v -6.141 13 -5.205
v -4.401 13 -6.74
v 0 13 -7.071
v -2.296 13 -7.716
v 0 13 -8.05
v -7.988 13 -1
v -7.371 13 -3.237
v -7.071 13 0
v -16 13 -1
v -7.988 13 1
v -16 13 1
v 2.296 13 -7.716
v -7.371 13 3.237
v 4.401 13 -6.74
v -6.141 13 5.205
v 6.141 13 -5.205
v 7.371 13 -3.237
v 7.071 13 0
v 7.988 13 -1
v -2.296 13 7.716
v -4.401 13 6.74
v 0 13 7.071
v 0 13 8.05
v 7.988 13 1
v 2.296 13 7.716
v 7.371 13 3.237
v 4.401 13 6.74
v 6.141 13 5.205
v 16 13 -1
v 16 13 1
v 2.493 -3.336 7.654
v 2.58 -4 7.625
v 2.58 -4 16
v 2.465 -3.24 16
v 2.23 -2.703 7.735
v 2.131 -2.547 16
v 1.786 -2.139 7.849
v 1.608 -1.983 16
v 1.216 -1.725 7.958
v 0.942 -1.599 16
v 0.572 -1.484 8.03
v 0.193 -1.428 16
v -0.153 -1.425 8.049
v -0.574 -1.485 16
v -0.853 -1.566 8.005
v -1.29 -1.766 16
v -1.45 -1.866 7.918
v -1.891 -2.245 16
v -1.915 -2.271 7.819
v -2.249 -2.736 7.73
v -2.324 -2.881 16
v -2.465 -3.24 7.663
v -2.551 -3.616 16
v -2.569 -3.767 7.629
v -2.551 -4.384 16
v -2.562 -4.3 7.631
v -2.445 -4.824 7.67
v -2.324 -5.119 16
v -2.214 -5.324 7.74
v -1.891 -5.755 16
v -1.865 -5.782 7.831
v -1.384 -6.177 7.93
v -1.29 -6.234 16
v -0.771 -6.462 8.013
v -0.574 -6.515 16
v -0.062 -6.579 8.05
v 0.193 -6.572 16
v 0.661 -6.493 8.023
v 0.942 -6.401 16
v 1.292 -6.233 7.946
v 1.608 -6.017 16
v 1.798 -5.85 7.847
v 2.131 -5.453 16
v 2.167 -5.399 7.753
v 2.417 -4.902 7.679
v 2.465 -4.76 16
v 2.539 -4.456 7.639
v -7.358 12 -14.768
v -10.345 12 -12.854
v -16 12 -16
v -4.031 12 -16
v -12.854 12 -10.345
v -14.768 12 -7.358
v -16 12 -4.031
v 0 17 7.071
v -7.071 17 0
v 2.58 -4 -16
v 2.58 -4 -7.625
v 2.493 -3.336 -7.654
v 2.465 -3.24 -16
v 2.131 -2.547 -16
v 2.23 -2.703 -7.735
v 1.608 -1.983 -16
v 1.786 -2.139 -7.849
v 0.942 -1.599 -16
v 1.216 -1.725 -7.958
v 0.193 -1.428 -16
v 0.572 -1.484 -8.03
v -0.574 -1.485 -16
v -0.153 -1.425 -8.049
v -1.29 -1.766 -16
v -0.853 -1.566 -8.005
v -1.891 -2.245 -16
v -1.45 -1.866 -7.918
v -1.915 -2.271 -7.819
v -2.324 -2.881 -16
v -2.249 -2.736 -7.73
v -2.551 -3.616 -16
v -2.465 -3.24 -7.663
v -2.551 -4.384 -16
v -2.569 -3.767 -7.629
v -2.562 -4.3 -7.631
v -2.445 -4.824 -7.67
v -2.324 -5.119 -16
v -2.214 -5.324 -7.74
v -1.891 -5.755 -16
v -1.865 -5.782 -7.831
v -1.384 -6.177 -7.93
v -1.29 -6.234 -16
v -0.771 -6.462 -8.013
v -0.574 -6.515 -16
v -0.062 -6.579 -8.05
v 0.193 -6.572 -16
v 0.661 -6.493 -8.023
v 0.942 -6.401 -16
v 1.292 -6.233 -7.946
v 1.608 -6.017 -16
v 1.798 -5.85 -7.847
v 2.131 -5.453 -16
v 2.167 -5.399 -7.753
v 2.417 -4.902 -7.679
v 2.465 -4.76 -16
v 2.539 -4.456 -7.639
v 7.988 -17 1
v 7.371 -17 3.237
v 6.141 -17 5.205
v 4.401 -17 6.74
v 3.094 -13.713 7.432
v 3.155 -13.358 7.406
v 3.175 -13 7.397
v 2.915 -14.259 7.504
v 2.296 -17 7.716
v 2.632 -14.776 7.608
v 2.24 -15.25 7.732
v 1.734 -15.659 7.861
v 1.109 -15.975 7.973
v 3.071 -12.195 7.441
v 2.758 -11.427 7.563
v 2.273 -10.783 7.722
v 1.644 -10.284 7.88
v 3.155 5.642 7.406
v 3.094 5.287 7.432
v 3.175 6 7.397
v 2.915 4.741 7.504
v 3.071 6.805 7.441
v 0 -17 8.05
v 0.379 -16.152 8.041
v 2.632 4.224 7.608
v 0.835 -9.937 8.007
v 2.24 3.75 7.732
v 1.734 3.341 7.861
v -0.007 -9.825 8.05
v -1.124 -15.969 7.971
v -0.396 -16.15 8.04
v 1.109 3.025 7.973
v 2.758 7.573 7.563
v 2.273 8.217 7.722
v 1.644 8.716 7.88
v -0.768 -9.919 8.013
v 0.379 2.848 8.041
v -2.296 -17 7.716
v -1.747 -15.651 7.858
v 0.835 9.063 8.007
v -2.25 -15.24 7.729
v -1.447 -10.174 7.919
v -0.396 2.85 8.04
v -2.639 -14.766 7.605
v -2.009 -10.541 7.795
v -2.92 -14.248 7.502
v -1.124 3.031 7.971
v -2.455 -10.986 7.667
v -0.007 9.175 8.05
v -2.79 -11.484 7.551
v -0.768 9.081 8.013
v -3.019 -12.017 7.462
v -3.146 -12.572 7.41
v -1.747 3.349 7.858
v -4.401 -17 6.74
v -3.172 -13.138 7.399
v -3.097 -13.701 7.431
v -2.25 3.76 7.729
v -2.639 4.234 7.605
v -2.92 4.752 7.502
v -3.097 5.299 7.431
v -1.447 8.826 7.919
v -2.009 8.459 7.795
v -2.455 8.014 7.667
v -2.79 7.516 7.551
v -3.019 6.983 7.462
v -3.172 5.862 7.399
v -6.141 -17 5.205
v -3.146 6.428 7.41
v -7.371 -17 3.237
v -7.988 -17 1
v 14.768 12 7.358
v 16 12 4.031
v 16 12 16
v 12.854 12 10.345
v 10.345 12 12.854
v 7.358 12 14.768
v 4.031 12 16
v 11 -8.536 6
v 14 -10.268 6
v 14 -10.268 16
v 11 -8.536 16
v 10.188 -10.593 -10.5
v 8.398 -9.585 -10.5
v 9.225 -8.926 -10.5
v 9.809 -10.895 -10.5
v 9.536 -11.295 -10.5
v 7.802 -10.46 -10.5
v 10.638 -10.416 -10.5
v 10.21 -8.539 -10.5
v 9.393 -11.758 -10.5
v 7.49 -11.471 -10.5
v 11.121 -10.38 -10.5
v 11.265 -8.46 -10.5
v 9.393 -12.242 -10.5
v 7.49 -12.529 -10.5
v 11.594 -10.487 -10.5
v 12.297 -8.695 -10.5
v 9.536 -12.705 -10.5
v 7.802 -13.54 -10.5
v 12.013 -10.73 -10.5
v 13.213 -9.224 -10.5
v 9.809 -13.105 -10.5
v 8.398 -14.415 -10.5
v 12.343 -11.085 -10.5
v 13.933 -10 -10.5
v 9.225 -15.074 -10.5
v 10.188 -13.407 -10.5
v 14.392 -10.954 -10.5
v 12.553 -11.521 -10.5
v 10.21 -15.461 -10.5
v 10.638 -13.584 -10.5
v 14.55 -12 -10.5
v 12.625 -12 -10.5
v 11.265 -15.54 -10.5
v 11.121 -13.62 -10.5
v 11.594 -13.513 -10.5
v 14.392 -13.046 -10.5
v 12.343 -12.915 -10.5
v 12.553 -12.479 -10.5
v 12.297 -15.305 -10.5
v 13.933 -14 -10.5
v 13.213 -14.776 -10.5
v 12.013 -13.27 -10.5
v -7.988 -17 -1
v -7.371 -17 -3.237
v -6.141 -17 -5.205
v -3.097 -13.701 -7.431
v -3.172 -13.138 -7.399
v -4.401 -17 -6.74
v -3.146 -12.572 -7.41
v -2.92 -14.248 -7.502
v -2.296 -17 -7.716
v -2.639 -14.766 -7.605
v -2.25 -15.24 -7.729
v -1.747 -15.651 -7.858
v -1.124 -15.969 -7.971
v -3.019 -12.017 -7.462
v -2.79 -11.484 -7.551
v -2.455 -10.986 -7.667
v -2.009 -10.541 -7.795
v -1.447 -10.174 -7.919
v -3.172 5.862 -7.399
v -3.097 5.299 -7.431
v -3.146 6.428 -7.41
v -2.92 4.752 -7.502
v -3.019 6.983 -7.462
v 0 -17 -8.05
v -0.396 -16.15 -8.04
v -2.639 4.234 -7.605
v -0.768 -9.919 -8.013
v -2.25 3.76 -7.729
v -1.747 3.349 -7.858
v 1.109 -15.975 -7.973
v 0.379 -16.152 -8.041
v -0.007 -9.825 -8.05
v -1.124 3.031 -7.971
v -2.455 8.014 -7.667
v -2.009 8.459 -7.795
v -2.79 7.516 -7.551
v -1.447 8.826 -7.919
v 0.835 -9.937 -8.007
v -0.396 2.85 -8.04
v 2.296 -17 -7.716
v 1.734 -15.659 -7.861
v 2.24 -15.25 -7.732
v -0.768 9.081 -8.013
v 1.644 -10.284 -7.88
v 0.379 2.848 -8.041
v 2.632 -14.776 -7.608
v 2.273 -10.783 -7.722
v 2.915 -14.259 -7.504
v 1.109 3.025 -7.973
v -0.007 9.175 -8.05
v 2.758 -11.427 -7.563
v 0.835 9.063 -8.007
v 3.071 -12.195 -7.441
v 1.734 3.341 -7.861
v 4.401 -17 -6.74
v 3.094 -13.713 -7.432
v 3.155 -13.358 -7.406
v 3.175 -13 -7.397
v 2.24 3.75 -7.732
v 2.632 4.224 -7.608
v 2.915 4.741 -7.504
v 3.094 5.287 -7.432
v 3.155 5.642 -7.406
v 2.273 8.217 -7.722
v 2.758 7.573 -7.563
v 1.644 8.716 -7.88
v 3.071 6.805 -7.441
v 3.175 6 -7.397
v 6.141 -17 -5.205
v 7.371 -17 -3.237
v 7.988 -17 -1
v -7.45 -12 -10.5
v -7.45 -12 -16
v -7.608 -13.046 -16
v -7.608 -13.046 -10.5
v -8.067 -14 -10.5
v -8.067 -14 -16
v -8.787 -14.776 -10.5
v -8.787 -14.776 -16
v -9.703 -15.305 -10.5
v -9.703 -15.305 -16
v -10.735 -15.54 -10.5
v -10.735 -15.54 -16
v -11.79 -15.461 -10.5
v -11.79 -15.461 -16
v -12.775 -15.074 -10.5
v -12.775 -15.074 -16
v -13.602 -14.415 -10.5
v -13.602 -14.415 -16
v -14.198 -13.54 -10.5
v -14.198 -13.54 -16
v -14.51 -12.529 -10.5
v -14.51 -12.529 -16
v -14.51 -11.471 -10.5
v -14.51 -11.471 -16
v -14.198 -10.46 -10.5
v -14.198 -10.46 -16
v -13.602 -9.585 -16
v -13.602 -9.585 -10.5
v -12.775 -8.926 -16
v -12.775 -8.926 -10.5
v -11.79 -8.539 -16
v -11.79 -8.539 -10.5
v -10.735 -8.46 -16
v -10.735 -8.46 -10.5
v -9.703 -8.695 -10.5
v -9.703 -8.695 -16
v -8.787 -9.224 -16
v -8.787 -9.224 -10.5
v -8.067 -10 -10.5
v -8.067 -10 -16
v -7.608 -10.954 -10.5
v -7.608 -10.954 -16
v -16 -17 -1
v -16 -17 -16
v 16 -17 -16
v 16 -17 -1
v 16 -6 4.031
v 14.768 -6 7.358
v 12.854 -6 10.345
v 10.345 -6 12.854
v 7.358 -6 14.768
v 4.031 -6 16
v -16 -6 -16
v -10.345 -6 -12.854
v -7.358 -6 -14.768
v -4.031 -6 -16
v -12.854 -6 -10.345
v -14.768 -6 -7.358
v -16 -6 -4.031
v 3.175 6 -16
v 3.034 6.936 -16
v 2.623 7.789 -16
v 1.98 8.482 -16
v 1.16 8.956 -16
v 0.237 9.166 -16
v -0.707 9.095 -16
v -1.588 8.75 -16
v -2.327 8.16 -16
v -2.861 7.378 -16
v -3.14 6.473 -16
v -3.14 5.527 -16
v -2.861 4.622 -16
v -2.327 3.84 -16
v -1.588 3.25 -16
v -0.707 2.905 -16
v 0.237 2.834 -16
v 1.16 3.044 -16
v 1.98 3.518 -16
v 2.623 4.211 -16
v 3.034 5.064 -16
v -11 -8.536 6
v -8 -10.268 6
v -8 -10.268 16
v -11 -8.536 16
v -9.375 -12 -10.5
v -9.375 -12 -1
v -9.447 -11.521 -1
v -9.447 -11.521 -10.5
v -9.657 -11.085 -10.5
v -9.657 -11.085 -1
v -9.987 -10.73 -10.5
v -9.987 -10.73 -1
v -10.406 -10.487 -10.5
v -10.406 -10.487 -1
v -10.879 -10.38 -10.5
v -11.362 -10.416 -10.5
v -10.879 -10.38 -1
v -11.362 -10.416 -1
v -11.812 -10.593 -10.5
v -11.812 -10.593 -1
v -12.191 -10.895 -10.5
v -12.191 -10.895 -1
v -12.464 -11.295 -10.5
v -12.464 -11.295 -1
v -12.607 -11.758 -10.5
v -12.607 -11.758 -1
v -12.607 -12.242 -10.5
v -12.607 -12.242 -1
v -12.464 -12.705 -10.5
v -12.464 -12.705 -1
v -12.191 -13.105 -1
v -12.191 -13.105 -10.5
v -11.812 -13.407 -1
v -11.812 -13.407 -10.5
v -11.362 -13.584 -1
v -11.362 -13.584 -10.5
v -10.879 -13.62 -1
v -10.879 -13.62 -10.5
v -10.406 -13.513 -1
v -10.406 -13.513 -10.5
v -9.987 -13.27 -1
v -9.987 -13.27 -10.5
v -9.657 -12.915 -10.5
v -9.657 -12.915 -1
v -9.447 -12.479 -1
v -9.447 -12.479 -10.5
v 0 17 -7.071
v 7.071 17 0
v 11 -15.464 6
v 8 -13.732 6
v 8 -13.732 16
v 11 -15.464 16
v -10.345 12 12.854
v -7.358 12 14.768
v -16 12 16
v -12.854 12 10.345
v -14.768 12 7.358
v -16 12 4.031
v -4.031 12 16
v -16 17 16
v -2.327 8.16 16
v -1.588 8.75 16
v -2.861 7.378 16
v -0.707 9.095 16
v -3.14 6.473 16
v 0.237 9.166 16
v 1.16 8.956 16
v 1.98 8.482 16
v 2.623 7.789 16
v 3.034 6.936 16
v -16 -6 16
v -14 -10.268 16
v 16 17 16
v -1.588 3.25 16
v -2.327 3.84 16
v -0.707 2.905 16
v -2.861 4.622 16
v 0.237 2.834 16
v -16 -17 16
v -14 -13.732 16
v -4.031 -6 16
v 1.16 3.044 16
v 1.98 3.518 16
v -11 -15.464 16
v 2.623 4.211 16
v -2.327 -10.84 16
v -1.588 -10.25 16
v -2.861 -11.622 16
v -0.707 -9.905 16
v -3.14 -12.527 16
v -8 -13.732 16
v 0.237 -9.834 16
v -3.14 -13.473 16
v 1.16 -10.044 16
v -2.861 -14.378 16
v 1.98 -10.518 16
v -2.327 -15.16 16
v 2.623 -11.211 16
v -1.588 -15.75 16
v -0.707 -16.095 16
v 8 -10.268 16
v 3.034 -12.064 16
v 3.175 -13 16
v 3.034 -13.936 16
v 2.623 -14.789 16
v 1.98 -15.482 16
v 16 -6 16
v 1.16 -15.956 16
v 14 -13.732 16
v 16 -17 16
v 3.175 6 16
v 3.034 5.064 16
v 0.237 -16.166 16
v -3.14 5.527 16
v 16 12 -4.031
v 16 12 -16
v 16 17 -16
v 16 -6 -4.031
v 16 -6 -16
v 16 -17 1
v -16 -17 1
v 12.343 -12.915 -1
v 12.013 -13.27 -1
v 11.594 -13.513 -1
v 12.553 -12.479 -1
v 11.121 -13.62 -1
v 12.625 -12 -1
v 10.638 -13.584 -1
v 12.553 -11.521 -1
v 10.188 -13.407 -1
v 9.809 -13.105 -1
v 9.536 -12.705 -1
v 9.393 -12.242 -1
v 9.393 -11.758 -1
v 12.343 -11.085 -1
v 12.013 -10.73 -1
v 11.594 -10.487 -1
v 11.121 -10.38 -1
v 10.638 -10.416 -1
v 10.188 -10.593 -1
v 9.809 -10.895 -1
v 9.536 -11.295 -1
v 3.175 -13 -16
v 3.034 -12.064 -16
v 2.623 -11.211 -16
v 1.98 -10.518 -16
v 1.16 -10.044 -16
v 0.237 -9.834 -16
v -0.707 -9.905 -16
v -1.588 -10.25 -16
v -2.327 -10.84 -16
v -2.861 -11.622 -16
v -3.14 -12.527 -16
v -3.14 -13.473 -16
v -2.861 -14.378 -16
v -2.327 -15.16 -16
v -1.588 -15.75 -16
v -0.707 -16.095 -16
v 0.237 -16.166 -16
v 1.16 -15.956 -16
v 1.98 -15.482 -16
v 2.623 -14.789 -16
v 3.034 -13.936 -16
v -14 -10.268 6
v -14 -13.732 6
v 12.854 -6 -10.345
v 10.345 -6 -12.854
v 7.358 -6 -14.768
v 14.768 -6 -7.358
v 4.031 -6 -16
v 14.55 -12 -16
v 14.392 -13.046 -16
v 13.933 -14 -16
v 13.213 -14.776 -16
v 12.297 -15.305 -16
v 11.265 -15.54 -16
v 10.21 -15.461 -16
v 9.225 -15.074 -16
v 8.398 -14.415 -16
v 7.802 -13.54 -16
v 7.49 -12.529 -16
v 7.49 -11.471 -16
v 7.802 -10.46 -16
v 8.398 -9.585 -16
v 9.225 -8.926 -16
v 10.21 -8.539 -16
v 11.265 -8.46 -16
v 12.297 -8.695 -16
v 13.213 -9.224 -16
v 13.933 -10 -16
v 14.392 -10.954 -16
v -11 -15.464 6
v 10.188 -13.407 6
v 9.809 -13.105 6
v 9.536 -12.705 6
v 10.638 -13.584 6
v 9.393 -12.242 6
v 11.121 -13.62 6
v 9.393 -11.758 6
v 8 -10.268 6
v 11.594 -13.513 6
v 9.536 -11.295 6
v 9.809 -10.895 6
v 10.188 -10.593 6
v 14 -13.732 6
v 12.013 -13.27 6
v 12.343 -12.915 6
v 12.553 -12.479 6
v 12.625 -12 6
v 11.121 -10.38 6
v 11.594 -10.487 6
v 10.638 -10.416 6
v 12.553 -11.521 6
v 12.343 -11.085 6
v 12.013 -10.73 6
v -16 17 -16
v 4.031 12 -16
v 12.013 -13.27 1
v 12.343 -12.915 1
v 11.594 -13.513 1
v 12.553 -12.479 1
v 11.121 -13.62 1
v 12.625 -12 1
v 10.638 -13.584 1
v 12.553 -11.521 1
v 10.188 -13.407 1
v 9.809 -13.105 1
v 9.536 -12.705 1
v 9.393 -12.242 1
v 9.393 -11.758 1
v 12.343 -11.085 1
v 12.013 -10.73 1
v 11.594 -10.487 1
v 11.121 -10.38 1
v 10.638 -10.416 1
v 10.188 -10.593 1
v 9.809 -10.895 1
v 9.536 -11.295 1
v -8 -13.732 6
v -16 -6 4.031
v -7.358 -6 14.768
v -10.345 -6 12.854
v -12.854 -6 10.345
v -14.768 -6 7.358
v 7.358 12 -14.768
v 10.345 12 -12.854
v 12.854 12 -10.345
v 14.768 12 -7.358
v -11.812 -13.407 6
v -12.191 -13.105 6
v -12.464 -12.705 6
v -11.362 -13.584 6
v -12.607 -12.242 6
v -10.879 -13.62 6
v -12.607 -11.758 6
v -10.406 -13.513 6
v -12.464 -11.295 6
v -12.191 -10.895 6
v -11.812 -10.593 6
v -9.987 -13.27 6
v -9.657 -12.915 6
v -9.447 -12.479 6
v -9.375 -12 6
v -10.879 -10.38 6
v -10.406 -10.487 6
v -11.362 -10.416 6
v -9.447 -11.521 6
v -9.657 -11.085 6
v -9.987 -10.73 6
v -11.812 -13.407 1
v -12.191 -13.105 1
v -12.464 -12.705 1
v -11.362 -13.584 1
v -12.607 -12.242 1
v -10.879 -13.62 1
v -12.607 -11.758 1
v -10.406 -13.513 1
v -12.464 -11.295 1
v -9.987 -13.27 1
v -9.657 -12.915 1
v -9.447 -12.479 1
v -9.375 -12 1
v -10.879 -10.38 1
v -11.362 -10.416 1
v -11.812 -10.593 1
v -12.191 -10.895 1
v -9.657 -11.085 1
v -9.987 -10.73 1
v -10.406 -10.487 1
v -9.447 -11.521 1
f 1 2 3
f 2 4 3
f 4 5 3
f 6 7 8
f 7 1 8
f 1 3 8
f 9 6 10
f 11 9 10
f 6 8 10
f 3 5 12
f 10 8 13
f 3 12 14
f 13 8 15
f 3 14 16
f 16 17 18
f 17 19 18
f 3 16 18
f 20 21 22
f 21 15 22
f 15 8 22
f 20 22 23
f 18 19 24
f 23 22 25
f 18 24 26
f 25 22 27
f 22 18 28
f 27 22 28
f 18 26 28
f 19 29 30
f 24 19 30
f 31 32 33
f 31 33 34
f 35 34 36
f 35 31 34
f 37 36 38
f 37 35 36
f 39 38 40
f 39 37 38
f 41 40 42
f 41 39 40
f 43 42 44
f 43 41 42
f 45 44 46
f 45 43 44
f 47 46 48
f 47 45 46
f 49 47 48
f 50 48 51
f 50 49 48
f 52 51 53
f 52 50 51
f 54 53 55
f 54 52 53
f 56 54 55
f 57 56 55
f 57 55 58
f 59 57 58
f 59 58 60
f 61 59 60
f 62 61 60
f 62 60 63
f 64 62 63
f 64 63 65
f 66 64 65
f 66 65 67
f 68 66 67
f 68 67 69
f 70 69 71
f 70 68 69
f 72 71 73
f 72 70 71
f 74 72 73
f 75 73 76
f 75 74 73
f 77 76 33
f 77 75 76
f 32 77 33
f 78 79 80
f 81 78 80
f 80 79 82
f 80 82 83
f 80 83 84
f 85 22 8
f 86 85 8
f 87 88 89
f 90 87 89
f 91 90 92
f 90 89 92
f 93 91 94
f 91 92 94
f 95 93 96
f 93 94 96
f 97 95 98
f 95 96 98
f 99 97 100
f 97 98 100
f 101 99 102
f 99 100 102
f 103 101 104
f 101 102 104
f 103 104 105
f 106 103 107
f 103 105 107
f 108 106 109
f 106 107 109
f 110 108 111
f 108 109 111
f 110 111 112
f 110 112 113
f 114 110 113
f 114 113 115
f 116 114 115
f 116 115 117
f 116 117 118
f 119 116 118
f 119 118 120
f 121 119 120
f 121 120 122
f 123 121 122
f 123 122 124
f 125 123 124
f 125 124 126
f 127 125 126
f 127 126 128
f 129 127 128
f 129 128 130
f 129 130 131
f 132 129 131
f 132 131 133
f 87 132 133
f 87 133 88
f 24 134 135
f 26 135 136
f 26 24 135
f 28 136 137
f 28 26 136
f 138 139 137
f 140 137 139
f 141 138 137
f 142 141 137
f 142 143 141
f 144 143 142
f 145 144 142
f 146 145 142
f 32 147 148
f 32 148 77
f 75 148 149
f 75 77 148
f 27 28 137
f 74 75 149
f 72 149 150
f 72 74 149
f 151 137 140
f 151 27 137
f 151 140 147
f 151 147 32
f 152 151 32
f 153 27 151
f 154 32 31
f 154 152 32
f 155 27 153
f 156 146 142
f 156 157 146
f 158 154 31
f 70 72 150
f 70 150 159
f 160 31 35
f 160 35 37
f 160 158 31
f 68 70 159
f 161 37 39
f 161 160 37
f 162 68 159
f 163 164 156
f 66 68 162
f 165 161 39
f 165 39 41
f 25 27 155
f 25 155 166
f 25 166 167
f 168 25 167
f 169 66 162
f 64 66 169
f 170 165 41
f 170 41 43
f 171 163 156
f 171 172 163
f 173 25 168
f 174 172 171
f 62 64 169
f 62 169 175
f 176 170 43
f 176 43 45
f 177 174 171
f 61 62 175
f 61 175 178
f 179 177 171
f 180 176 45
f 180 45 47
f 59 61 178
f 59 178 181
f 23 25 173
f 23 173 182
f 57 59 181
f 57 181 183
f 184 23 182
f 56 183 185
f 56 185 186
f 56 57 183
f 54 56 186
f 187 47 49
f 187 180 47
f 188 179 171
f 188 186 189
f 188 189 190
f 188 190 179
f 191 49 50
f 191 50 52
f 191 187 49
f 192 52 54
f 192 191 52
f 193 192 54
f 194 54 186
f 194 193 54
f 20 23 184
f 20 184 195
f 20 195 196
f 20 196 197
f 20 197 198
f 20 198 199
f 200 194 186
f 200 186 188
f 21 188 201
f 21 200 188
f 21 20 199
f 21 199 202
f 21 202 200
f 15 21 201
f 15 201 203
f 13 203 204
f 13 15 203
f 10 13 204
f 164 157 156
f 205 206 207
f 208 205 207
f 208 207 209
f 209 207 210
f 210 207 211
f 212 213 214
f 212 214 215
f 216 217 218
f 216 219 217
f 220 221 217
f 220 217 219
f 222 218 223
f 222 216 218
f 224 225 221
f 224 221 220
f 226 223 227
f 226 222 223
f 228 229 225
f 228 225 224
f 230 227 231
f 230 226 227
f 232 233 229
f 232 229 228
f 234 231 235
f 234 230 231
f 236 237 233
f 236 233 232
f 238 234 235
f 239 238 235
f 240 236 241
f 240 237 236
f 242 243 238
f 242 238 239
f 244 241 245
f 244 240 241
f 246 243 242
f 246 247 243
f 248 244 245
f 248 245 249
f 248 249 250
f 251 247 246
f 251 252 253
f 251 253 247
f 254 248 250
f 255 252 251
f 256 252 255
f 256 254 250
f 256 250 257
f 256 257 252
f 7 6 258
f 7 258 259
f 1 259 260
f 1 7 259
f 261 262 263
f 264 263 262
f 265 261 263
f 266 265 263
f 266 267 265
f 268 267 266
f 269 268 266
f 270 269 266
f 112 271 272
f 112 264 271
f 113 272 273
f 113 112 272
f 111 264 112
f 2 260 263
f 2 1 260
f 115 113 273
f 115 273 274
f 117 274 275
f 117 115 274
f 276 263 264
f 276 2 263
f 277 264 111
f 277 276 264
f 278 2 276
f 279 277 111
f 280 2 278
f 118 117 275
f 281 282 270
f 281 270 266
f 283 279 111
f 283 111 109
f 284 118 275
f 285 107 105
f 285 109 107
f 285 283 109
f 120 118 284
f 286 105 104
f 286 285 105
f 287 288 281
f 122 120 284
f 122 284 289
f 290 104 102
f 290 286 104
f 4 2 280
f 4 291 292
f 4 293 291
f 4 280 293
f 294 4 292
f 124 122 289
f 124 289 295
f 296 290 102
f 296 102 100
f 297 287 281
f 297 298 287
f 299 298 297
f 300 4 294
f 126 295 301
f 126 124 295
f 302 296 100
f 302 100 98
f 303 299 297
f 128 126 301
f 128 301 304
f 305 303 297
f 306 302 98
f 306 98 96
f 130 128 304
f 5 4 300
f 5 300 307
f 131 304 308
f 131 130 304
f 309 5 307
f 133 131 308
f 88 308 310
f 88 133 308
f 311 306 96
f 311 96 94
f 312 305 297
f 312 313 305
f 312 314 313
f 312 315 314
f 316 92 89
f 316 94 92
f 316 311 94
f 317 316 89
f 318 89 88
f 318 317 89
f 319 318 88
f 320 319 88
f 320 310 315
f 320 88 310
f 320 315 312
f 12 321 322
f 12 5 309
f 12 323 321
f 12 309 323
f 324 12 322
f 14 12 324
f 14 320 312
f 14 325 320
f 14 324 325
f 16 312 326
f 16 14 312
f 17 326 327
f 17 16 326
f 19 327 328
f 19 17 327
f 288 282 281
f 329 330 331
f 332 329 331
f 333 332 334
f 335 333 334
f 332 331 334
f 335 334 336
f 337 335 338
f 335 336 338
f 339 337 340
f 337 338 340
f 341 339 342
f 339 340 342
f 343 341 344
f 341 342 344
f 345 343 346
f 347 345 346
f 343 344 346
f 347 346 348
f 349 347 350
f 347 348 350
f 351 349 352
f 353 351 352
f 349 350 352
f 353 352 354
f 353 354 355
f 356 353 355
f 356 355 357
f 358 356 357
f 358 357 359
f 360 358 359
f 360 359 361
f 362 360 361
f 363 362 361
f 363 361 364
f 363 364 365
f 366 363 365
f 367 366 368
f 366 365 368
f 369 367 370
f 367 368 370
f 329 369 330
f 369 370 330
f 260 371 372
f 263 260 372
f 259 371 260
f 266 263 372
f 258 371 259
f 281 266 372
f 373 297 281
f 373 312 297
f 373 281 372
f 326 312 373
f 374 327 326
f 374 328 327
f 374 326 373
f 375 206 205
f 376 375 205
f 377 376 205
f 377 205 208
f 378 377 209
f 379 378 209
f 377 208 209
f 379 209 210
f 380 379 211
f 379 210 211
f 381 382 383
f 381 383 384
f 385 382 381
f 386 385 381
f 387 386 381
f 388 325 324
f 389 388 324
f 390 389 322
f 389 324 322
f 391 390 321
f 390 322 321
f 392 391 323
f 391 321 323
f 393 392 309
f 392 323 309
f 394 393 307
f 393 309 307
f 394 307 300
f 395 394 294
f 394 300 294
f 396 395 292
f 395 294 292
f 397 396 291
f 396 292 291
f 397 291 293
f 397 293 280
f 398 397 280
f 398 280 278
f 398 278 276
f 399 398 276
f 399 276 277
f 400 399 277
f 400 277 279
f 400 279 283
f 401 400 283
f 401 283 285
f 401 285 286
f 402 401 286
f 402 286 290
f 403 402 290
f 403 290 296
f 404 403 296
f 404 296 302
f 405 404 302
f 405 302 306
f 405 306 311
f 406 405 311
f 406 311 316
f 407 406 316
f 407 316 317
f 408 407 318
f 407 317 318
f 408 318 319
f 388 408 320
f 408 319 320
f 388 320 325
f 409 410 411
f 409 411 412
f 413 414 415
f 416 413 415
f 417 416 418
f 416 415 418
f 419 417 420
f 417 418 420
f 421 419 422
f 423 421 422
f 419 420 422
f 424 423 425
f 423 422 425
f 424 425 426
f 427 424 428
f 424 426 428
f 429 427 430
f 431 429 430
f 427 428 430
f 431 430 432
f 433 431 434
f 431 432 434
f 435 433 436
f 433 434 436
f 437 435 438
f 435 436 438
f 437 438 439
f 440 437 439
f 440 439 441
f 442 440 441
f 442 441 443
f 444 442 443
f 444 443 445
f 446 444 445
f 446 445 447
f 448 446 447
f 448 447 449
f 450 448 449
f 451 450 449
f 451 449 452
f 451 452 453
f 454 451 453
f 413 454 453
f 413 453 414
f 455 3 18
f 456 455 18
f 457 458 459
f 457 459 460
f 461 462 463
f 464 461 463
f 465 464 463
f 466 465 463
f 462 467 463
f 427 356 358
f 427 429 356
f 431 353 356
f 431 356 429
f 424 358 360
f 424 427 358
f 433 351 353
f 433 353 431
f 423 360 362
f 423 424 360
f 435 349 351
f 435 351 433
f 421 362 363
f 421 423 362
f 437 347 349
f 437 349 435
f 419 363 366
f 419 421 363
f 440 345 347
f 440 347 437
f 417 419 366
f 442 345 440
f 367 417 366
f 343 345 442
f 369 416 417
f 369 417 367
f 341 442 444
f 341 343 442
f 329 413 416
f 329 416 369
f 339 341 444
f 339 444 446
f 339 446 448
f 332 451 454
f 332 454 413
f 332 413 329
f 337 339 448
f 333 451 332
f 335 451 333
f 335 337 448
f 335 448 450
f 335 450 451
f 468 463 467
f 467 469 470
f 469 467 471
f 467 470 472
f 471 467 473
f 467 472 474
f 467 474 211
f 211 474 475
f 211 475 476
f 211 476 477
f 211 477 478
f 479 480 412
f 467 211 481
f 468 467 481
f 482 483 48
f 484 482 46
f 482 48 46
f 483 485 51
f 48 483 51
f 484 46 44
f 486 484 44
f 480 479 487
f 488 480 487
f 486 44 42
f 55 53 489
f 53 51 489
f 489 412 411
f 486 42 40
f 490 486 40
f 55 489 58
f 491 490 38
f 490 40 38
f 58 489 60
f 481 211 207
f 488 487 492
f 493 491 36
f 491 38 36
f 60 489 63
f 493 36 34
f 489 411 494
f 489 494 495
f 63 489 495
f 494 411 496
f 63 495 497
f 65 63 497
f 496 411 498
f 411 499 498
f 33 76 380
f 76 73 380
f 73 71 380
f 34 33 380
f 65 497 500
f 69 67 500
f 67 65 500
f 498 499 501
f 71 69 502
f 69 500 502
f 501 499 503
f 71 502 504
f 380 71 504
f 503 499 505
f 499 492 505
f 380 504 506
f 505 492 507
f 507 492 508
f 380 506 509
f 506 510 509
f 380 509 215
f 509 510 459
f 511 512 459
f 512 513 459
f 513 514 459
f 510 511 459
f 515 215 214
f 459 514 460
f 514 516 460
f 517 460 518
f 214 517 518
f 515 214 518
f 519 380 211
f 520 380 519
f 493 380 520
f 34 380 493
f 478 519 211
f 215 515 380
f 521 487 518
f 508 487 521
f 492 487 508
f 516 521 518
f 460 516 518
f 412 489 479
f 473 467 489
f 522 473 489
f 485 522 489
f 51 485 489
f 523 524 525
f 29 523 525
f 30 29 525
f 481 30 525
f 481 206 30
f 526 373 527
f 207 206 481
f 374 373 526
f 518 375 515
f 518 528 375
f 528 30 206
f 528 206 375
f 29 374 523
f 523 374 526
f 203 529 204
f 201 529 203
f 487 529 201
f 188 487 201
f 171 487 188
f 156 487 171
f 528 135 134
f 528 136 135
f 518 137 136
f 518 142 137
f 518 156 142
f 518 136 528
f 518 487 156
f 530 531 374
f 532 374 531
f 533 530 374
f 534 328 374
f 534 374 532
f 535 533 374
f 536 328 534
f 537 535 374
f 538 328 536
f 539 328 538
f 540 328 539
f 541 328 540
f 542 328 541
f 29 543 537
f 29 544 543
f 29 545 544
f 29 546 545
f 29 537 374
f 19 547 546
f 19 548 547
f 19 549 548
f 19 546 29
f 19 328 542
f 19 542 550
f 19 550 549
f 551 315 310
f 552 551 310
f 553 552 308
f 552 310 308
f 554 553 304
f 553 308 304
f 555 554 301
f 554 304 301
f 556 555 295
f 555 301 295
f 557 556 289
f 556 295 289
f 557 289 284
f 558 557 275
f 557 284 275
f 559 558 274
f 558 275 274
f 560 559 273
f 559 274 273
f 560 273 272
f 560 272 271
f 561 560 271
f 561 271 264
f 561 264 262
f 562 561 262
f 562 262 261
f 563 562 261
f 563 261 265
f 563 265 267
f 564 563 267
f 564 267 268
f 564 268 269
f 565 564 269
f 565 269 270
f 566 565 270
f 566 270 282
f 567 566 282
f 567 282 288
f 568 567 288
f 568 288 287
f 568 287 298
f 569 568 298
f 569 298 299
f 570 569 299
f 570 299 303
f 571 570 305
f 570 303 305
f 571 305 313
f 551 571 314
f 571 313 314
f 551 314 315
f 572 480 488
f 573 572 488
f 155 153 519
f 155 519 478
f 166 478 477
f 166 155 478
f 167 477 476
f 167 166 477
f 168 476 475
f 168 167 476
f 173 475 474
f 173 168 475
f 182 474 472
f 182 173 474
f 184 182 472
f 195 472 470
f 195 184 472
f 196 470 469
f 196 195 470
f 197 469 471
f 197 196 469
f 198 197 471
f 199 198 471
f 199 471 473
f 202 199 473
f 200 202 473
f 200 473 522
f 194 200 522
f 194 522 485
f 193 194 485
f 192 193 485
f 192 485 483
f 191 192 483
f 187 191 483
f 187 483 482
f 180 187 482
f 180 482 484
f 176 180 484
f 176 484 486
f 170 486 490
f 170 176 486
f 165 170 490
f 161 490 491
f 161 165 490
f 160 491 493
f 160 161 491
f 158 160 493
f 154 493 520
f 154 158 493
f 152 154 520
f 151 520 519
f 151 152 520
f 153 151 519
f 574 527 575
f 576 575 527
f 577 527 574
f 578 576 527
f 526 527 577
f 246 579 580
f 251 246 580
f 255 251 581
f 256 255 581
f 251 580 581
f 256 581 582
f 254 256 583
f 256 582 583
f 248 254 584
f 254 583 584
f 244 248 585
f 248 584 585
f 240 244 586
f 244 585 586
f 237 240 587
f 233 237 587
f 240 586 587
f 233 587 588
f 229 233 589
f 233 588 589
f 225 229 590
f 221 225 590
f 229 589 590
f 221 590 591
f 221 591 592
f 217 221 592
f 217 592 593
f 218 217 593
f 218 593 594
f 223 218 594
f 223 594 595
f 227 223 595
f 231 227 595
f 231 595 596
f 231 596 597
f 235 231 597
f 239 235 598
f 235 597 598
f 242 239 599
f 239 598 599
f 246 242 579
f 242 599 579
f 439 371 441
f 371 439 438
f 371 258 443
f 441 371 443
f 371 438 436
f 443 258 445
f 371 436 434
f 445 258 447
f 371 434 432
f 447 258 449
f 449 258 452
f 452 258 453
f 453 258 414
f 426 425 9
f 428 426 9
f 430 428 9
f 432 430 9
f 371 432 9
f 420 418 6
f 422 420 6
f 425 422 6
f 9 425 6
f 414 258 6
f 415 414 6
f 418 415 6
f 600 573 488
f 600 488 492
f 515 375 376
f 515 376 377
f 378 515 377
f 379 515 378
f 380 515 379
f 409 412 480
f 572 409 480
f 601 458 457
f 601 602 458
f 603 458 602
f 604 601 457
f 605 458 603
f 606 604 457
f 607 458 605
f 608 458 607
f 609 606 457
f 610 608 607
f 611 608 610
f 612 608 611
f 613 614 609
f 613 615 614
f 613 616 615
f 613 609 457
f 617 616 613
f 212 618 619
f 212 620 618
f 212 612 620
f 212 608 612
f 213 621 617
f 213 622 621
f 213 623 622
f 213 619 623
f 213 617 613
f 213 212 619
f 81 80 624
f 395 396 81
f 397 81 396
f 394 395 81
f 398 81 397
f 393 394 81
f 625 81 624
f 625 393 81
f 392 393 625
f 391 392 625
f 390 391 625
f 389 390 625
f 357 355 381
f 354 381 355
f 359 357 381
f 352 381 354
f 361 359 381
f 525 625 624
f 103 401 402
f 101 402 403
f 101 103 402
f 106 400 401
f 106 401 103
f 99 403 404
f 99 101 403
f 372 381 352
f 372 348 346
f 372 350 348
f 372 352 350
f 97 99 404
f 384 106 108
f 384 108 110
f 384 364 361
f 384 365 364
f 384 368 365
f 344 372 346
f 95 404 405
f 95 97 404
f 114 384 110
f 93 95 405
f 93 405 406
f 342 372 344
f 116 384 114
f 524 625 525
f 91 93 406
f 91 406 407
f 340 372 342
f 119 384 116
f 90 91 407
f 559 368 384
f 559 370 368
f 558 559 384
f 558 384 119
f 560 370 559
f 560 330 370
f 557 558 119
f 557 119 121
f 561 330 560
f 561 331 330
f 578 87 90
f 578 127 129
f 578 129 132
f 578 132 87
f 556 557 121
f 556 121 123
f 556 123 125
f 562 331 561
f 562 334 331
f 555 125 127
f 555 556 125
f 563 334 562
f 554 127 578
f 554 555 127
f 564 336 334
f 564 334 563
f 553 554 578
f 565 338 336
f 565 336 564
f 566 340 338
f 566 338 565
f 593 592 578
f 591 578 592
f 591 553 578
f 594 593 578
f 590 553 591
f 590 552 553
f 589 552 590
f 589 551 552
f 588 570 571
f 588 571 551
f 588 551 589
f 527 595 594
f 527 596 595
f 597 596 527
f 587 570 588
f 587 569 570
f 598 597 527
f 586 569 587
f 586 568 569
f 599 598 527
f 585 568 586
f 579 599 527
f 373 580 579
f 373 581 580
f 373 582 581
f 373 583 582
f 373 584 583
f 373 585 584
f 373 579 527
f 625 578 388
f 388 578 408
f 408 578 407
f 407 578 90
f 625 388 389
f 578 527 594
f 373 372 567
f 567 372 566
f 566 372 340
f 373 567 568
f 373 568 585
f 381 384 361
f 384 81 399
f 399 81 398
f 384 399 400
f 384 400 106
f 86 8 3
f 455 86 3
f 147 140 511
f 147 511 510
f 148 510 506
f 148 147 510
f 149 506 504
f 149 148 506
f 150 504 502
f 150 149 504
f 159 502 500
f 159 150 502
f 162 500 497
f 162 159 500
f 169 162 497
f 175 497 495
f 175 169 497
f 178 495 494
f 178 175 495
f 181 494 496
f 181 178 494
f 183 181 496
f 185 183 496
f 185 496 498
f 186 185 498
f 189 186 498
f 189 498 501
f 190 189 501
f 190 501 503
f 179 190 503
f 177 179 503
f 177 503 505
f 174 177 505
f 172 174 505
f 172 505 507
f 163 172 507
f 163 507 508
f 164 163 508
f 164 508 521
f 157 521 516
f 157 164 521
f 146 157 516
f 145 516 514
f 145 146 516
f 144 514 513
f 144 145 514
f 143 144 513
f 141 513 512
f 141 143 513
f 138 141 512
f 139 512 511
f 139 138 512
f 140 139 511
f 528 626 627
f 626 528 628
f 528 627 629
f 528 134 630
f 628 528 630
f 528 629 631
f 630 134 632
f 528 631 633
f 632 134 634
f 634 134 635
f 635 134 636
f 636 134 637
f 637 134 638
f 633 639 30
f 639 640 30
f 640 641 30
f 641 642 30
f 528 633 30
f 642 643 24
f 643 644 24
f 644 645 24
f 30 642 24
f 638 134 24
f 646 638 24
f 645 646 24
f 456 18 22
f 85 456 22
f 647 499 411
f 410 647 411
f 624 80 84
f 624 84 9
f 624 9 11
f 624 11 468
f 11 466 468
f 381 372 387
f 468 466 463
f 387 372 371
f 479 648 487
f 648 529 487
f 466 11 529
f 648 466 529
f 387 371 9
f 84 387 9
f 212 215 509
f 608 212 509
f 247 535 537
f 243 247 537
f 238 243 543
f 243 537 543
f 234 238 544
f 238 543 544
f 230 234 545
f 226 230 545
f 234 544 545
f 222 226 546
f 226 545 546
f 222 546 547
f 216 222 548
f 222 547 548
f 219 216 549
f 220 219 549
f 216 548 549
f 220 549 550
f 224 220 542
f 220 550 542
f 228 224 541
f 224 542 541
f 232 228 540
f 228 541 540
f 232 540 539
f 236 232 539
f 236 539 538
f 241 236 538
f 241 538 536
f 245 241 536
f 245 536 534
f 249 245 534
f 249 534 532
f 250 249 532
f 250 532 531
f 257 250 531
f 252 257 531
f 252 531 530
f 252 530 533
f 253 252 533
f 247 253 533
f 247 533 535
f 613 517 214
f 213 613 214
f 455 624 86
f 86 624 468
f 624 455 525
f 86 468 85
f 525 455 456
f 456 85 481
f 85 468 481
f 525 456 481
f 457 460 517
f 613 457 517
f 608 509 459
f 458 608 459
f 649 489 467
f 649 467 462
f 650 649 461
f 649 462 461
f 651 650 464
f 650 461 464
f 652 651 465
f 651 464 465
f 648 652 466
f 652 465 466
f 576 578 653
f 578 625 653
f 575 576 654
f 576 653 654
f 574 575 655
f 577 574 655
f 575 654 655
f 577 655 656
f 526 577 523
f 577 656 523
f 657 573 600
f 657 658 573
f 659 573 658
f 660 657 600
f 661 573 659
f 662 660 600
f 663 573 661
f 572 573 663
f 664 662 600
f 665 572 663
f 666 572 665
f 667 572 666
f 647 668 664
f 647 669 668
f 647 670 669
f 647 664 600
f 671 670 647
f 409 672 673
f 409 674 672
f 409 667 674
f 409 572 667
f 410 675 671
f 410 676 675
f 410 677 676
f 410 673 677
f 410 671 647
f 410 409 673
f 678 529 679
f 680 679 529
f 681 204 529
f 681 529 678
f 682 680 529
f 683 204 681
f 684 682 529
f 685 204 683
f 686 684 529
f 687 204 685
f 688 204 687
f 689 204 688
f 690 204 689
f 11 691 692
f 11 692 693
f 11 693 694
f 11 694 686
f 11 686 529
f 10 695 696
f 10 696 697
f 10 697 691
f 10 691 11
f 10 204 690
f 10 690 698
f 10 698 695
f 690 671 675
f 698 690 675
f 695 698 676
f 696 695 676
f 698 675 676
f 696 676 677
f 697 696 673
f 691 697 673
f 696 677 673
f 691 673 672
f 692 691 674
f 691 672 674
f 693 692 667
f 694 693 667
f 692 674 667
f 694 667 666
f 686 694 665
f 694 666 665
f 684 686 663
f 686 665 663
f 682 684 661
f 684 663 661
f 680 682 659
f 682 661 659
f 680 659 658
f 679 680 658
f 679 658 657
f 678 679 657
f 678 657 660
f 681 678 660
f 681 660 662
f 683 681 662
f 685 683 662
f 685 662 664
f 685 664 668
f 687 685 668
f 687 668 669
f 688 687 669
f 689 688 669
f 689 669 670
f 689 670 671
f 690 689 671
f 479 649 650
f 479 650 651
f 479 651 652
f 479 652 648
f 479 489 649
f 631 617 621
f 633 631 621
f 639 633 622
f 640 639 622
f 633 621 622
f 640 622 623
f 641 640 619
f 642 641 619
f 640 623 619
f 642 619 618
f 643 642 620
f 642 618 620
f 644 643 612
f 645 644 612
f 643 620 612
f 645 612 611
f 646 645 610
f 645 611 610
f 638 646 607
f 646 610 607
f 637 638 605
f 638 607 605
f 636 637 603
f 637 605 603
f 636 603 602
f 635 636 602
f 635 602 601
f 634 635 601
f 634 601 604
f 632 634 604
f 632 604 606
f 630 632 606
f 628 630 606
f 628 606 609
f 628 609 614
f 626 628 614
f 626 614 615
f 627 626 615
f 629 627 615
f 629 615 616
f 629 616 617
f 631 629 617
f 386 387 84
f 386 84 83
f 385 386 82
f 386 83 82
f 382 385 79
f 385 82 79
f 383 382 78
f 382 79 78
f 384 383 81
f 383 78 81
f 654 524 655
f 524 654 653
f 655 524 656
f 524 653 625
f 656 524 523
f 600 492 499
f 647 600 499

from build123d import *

# Parameters (mm, degrees)
F0_W          = 32
F0_H          = 32
F1_DEPTH      = 17
F2_R          = 8.05
F3_DEPTH      = 13
F3_DEPTH_BACK = 17
F4_W          = 32
F4_H          = 2
F5_DEPTH      = 16.001
F5_DEPTH_BACK = 16.001
F6_R          = 3.175
F6_R_2        = 2.5796875
F7_DEPTH      = 16.001
F7_DEPTH_BACK = 16.001
F8_R          = 1.625
F9_DEPTH      = 32.0010001
F10_R         = 3.55
F12_DEPTH     = 5.5
F13_DEPTH     = 10
F15_DEPTH     = 4.001
F16_W         = 9.5
F16_H         = 18


with BuildPart() as f1:
    # F0 (on Front) → F1 (new body, symmetric)
    with BuildSketch(Plane.XZ):
        Rectangle(F0_W, F0_H)
    extrude(amount=F1_DEPTH, both=True)

    # F2 (on Front) → F3 (cut, two sides)
    with BuildSketch(Plane.XZ) as f3_sk:
        Circle(F2_R)
    extrude(amount=-F3_DEPTH, mode=Mode.SUBTRACT)
    extrude(f3_sk.sketch, amount=F3_DEPTH_BACK, mode=Mode.SUBTRACT)

    # F4 (on Right) → F5 (cut, two sides)
    with BuildSketch(Plane.YZ) as f5_sk:
        with Locations((-3, 0)):
            Rectangle(F4_W, F4_H)
    extrude(amount=-F5_DEPTH, mode=Mode.SUBTRACT)
    extrude(f5_sk.sketch, amount=F5_DEPTH_BACK, mode=Mode.SUBTRACT)

    # F6 (on Top) → F7 (cut, two sides)
    with BuildSketch(Plane.XY) as f7_sk:
        with Locations((0, 6)):
            Circle(F6_R)
        with Locations((0, -4)):
            Circle(F6_R_2)
        with Locations((0, -13)):
            Circle(F6_R)
    extrude(amount=-F7_DEPTH, mode=Mode.SUBTRACT)
    extrude(f7_sk.sketch, amount=F7_DEPTH_BACK, mode=Mode.SUBTRACT)

    # F8 (on face) → F9 (cut, through all)
    with BuildSketch(Plane.XY.offset(16)):
        with Locations((-11, -12)):
            Circle(F8_R)
        with Locations((11, -12)):
            Circle(F8_R)
    extrude(amount=-F9_DEPTH, mode=Mode.SUBTRACT)

    # F10 (on face) → F12 (cut)
    with BuildSketch(Plane(origin=(0, 0, -16), x_dir=(1, 0, 0), z_dir=(0, 0, -1))):
        with Locations((11, 12)):
            Circle(F10_R)
        with Locations((-11, 12)):
            Circle(F10_R)
    extrude(amount=-F12_DEPTH, mode=Mode.SUBTRACT)

    # F11 (on face) → F13 (cut)
    with BuildSketch(Plane.XY.offset(16)):
        Polygon((-8, -13.7320508076), (-8, -10.2679491924), (-11, -8.5358983849), (-14, -10.2679491924), (-14, -13.7320508076), (-11, -15.4641016151), align=None)
        Polygon((8, -10.2679491924), (8, -13.7320508076), (11, -15.4641016151), (14, -13.7320508076), (14, -10.2679491924), (11, -8.5358983849), align=None)
    extrude(amount=-F13_DEPTH, mode=Mode.SUBTRACT)

    # F14 (on face) → F15 (cut, through all)
    with BuildSketch(Plane.XZ.offset(-13)):
        Polygon((0, -7.0710678119), (7.0710678119, 0), (0, 7.0710678119), (-7.0710678119, 0), align=None)
    extrude(amount=-F15_DEPTH, mode=Mode.SUBTRACT)

    # F16 (on Top) → F17 (revolve, cut)
    with BuildSketch(Plane.XY):
        with Locations((21.25, 3)):
            Rectangle(F16_W, F16_H)
    revolve(axis=Axis((0, -3.4330706112, 0), (0, -1, 0)), mode=Mode.SUBTRACT)


solid = f1.part
